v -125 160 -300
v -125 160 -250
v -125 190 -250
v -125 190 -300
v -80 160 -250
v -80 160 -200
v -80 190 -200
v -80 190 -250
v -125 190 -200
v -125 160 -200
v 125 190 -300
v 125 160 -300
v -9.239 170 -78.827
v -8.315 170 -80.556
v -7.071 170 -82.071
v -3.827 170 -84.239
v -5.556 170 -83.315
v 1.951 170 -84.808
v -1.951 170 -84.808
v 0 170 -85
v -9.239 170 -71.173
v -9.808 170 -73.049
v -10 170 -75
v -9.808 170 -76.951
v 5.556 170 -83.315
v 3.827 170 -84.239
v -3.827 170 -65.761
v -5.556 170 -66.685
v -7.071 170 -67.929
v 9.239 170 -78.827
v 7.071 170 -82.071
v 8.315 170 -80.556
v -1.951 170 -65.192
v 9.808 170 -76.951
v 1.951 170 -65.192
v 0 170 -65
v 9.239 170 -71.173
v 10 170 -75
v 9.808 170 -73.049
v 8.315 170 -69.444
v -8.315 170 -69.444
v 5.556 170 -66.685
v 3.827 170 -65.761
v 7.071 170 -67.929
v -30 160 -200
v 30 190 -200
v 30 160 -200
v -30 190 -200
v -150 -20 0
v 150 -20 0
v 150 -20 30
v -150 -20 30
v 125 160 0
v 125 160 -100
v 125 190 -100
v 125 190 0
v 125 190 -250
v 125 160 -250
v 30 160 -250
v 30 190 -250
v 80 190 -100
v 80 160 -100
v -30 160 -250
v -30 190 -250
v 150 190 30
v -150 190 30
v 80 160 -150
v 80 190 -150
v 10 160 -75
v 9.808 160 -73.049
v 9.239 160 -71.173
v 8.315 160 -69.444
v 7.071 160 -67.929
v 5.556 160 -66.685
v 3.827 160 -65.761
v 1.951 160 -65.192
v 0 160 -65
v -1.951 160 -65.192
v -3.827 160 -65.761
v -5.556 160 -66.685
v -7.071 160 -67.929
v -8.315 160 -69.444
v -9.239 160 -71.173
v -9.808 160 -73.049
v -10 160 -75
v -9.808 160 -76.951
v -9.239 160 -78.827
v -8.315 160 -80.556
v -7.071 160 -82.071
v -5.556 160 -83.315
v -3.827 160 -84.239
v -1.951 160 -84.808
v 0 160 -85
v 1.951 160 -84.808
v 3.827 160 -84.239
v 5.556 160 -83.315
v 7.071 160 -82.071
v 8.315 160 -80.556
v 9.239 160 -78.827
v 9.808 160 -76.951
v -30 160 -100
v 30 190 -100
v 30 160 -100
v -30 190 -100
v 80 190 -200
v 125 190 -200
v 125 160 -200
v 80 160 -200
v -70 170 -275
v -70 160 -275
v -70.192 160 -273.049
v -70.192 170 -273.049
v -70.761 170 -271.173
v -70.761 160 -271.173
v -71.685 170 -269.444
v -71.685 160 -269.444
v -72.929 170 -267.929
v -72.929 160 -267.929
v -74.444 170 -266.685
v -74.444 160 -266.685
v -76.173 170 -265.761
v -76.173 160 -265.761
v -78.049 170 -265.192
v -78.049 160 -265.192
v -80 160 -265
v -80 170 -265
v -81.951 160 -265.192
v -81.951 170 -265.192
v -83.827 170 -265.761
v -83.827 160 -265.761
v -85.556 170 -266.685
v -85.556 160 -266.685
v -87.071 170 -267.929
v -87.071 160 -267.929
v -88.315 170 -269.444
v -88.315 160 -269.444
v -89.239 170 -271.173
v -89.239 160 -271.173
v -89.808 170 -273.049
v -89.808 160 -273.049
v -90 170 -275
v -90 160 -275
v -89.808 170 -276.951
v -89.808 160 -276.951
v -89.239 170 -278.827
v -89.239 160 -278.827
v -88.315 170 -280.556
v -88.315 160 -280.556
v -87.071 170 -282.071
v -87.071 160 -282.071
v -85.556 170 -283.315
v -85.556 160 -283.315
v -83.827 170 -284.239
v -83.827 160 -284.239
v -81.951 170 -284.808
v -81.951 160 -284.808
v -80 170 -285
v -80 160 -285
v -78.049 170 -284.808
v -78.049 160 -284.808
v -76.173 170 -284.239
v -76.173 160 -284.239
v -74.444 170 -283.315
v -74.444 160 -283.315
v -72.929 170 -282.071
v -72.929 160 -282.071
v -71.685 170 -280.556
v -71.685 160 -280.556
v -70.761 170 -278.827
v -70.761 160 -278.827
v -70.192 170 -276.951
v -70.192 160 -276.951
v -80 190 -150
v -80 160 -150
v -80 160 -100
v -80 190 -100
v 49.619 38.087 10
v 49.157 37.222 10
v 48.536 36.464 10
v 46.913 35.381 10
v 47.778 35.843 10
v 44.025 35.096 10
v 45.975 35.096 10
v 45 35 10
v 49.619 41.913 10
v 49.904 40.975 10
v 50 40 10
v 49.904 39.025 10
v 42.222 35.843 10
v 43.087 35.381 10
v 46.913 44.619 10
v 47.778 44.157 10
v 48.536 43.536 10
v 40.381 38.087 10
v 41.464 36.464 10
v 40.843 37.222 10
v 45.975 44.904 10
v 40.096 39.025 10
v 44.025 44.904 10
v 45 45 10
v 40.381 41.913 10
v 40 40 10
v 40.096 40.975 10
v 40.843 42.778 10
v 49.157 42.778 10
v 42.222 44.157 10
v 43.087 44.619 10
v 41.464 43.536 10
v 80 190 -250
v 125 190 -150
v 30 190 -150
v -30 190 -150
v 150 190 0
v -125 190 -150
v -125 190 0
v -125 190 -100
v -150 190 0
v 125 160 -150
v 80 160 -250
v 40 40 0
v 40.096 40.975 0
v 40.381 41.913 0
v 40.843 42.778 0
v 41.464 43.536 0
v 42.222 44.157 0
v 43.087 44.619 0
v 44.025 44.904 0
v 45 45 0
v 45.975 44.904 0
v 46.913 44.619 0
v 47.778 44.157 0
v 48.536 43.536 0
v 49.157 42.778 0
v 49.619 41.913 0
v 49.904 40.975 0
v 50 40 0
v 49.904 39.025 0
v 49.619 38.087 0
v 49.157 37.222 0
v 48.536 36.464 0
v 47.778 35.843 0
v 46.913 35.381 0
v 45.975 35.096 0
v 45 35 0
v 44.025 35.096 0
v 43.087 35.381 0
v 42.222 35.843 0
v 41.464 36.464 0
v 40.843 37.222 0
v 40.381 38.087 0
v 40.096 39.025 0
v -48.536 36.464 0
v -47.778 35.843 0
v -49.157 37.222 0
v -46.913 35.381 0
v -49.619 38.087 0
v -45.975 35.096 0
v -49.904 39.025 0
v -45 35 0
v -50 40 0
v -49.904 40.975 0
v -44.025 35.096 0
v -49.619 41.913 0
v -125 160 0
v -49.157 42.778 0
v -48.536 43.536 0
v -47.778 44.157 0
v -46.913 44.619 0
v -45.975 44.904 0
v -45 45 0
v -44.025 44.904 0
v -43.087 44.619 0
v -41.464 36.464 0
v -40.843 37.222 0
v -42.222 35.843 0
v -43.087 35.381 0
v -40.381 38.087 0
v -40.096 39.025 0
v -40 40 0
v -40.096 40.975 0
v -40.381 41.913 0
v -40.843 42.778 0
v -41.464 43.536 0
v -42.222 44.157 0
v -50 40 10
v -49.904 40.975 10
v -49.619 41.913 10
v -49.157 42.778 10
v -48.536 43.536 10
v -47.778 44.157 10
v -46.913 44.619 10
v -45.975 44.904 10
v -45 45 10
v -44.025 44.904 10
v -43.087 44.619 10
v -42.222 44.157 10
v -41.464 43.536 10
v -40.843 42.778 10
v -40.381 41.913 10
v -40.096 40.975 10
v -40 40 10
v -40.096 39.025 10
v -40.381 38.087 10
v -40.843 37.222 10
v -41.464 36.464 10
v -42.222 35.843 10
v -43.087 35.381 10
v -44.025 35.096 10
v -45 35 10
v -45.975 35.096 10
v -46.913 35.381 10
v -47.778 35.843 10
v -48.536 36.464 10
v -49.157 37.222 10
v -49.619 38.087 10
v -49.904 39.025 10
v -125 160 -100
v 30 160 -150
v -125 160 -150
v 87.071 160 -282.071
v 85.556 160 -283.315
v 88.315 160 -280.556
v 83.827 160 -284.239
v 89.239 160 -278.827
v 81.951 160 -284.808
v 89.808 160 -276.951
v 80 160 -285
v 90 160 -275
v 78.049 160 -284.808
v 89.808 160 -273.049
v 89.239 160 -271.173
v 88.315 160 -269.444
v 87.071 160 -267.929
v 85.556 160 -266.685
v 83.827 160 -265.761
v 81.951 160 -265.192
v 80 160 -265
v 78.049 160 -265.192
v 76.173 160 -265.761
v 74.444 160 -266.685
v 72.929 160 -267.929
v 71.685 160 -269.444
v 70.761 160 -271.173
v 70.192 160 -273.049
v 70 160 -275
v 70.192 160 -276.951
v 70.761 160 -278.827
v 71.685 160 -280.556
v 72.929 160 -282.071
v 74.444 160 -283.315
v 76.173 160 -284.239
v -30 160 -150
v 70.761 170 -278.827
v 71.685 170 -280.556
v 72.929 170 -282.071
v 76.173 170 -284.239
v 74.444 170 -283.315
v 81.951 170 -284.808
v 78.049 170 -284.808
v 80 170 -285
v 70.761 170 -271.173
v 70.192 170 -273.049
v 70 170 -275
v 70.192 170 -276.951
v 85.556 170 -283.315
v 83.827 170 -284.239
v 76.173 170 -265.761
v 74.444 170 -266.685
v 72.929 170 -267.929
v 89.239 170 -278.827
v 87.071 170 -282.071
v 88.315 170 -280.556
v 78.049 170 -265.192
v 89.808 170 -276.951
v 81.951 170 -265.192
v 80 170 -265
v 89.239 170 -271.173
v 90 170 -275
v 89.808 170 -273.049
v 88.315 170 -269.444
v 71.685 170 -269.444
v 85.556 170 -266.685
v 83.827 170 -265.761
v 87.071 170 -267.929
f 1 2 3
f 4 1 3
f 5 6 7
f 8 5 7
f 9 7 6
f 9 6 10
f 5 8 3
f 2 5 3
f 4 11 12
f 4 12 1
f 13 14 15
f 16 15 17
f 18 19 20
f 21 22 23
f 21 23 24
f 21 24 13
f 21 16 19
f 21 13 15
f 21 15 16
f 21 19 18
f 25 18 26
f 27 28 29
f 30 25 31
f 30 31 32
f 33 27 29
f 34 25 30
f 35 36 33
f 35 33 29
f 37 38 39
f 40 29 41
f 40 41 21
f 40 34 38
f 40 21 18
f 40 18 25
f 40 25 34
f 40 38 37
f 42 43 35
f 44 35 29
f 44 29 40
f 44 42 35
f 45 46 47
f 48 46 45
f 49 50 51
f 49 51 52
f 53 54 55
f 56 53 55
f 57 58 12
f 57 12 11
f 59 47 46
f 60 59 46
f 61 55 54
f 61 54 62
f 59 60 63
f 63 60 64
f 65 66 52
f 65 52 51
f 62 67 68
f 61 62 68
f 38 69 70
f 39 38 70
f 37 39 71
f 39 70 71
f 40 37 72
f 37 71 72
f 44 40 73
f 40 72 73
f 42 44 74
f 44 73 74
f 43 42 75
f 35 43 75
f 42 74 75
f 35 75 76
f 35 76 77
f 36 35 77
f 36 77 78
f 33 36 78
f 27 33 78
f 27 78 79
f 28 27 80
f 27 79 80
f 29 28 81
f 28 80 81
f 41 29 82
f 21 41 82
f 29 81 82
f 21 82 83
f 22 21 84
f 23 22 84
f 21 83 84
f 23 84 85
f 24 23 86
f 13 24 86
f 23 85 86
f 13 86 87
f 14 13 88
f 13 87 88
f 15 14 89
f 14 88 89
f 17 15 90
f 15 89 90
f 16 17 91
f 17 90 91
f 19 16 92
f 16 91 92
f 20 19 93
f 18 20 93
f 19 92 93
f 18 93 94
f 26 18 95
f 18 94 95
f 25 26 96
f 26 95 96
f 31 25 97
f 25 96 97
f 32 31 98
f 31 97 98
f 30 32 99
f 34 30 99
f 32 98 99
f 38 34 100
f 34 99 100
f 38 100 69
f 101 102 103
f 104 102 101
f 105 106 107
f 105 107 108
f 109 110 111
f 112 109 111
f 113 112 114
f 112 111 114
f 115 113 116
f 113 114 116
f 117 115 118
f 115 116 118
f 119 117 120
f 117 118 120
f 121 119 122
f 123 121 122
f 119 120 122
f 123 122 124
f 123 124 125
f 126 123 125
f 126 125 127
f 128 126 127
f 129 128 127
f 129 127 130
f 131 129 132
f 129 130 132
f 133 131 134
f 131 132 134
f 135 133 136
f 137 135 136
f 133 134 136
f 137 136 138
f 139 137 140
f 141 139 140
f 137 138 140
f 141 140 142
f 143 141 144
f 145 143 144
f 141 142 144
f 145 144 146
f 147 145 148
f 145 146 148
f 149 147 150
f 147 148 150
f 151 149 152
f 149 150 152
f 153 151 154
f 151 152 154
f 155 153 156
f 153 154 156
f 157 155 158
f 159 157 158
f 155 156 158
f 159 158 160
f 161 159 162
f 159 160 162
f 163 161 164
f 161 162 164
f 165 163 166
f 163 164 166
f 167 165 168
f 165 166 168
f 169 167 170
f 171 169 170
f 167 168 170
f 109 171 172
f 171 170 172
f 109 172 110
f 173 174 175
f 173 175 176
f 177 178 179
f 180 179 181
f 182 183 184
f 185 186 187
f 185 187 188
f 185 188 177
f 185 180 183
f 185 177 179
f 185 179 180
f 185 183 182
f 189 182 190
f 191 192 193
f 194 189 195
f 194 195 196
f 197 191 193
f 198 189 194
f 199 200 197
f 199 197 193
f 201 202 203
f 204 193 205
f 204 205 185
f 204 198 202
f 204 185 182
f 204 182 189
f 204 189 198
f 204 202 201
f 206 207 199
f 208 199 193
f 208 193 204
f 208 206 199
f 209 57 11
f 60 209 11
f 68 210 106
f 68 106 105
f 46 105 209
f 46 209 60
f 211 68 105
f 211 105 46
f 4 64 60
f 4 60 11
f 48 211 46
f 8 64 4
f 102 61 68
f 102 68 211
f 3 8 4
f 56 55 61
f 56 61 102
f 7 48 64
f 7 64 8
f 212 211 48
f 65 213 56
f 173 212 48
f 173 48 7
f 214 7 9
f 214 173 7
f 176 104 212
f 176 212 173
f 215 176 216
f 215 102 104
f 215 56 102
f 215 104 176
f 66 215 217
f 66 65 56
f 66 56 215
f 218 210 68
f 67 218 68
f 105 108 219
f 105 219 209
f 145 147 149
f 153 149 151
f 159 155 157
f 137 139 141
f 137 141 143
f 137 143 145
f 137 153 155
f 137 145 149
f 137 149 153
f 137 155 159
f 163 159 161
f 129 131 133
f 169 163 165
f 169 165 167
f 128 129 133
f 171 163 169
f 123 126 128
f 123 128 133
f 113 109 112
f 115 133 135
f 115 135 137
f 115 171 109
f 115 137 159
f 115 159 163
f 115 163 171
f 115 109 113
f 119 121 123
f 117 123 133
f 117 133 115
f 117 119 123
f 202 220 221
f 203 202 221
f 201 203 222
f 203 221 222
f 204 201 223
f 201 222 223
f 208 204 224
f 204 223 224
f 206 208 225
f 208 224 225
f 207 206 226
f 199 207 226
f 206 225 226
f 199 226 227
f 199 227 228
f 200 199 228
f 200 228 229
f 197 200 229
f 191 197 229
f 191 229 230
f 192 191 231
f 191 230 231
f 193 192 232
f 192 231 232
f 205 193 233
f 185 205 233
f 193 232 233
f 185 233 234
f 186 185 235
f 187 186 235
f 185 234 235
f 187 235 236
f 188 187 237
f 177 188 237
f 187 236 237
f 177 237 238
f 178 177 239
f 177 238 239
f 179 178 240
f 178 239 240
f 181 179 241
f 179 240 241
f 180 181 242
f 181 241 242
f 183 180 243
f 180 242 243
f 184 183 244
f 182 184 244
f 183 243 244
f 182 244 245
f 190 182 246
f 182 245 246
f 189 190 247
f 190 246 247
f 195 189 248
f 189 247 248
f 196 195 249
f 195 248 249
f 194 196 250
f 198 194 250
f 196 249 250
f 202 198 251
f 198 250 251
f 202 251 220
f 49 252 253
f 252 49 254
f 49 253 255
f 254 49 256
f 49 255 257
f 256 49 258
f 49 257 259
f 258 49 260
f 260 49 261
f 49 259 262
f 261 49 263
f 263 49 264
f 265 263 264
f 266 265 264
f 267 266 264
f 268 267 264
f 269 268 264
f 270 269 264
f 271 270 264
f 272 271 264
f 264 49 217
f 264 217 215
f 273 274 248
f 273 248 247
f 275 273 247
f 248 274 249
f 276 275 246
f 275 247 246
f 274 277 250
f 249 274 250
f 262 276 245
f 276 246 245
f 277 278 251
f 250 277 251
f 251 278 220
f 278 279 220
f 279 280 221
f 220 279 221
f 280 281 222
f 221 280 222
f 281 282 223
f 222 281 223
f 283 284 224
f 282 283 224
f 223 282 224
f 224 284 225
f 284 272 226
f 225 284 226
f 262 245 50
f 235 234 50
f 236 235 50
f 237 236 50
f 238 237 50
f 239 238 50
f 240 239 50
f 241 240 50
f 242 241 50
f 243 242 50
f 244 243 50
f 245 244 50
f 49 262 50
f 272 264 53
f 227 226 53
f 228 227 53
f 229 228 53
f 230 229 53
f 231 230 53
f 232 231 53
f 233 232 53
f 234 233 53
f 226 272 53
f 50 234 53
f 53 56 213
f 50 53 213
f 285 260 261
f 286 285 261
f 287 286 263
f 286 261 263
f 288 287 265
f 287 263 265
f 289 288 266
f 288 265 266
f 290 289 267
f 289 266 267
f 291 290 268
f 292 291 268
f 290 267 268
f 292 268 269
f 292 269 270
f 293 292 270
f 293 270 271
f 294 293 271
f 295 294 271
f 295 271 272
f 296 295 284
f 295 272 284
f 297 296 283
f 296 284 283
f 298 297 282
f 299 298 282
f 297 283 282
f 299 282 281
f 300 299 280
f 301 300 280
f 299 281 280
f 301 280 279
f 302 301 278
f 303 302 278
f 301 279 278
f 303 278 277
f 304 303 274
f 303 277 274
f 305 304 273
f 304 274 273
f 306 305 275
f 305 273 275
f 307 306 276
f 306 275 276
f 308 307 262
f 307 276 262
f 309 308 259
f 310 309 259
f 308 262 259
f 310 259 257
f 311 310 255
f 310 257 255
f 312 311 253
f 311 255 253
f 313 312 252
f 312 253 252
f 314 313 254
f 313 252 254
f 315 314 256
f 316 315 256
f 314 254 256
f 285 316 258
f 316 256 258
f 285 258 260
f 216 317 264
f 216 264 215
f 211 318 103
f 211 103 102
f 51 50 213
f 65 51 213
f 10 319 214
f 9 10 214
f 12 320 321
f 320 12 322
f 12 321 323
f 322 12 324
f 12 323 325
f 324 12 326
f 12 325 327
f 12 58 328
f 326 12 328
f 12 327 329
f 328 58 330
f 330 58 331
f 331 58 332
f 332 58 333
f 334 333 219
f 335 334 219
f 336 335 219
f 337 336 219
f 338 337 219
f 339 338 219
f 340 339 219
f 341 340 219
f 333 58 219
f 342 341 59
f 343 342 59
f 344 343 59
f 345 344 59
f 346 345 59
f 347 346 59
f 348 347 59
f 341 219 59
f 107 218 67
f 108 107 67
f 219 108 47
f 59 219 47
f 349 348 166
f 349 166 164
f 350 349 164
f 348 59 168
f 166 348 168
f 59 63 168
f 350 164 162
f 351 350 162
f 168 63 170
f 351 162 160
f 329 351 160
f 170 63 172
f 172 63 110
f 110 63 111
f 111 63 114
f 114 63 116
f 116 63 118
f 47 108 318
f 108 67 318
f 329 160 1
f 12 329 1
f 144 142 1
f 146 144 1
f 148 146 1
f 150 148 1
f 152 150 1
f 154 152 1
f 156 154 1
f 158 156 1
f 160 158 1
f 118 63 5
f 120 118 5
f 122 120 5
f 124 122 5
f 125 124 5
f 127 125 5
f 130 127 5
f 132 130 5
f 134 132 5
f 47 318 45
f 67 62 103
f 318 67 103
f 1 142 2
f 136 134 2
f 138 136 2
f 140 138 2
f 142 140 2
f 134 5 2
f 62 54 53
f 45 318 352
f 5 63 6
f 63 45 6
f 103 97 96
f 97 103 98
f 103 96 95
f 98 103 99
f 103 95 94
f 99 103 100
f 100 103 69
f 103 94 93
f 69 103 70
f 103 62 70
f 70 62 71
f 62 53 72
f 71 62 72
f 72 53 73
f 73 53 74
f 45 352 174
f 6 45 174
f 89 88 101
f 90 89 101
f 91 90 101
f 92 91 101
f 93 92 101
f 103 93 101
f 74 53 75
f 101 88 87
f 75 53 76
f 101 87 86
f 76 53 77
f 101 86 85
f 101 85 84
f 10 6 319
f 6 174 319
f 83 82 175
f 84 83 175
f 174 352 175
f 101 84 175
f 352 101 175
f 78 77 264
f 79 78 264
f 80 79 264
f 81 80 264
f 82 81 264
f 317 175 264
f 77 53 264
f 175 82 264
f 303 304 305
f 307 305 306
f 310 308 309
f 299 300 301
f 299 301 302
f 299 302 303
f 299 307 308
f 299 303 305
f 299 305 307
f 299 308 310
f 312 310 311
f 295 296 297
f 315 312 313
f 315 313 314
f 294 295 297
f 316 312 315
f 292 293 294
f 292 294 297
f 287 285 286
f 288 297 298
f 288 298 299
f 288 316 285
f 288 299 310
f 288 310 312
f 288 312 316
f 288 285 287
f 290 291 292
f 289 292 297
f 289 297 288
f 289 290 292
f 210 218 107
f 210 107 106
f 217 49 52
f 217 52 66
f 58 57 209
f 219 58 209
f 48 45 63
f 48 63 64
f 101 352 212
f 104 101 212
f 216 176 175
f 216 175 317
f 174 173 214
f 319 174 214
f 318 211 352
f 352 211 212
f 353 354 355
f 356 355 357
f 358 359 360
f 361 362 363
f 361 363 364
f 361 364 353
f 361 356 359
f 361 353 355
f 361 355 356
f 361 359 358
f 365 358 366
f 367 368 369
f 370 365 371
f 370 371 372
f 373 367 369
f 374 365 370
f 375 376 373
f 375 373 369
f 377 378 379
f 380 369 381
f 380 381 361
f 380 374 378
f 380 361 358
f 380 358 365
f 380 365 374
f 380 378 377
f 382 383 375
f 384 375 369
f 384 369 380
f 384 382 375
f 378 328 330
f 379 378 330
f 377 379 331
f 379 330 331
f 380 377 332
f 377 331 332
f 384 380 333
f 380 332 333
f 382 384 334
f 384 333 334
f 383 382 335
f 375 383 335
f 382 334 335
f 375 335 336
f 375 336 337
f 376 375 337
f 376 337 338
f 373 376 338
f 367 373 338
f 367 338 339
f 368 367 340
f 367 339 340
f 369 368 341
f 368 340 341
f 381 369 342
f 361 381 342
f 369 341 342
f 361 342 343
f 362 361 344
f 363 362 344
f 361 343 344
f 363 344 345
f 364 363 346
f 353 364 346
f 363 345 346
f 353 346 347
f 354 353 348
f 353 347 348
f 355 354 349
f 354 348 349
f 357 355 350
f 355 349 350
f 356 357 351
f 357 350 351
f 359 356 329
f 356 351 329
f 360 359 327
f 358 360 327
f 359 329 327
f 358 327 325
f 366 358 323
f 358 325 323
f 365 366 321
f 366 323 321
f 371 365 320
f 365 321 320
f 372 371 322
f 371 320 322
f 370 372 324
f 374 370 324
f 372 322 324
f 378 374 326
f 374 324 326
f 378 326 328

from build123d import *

# Parameters (mm, degrees)
SKETCH1_W           = 300
SKETCH1_H           = 380
BOSS_EXTRUDE1_DEPTH = 30
SKETCH3_W           = 250
SKETCH3_H           = 30
BOSS_EXTRUDE2_DEPTH = 100
BOSS_EXTRUDE3_START = 150
SKETCH3_2_W         = 250
SKETCH3_2_H         = 30
BOSS_EXTRUDE3_DEPTH = 50
BOSS_EXTRUDE4_START = 250
SKETCH3_3_W         = 250
SKETCH3_3_H         = 30
BOSS_EXTRUDE4_DEPTH = 50
BOSS_EXTRUDE5_REACH = 303.662
SKETCH4_W           = 50
SKETCH4_H           = 30
BOSS_EXTRUDE6_START = -50
SKETCH4_2_W         = 50
SKETCH4_2_H         = 30
BOSS_EXTRUDE6_DEPTH = 50
SKETCH5_R           = 10
CUT_EXTRUDE1_DEPTH  = 10
SKETCH6_R           = 5
CUT_EXTRUDE2_DEPTH  = 10
SKETCH7_W           = 300
SKETCH7_H           = 170
CUT_EXTRUDE3_DEPTH  = 30


with BuildPart() as part:
    # Sketch1 → Boss-Extrude1 (new body)
    with BuildSketch(Plane.XY):
        Rectangle(SKETCH1_W, SKETCH1_H)
    extrude(amount=BOSS_EXTRUDE1_DEPTH)

    # Sketch3 → Boss-Extrude2 (add)
    with BuildSketch(Plane(origin=(0, 0, 0), x_dir=(-1, 0, 0), z_dir=(0, 0, -1))):
        with Locations((0, 175)):
            Rectangle(SKETCH3_W, SKETCH3_H)
    extrude(amount=BOSS_EXTRUDE2_DEPTH)

    # Sketch4 → Boss-Extrude5 (add, up to next)
    with BuildSketch(Plane.XY.offset(-150), mode=Mode.PRIVATE) as boss_extrude5_sk1:
        with Locations((-55, 175)):
            Rectangle(SKETCH4_W, SKETCH4_H)
    boss_extrude5_tool1 = extrude(boss_extrude5_sk1.sketch, amount=BOSS_EXTRUDE5_REACH, mode=Mode.PRIVATE) - part.part
    # Sketch4 → Boss-Extrude5 (add, up to next)
    with BuildSketch(Plane.XY.offset(-150), mode=Mode.PRIVATE) as boss_extrude5_sk2:
        with Locations((55, 175)):
            Rectangle(SKETCH4_W, SKETCH4_H)
    boss_extrude5_tool2 = extrude(boss_extrude5_sk2.sketch, amount=BOSS_EXTRUDE5_REACH, mode=Mode.PRIVATE) - part.part


with BuildPart() as body_2:
    # Sketch3<2> → Boss-Extrude3 (new body)
    with BuildSketch(Plane(origin=(0, 0, 0), x_dir=(-1, 0, 0), z_dir=(0, 0, -1)).offset(BOSS_EXTRUDE3_START)):
        with Locations((0, 175)):
            Rectangle(SKETCH3_2_W, SKETCH3_2_H)
    extrude(amount=BOSS_EXTRUDE3_DEPTH)


with BuildPart() as body_3:
    # Sketch3<3> → Boss-Extrude4 (new body)
    with BuildSketch(Plane(origin=(0, 0, 0), x_dir=(-1, 0, 0), z_dir=(0, 0, -1)).offset(BOSS_EXTRUDE4_START)):
        with Locations((0, 175)):
            Rectangle(SKETCH3_3_W, SKETCH3_3_H)
    extrude(amount=BOSS_EXTRUDE4_DEPTH)


with BuildPart() as part_1:
    add(part.part)

    add(body_2.part)  # Boss-Extrude5 merges body 2
    add(boss_extrude5_tool1.solids().sort_by_distance((-55, 175, -150))[0])
    add(boss_extrude5_tool2.solids().sort_by_distance((55, 175, -150))[0])


    add(body_3.part)  # Boss-Extrude6 merges body 3
    # Sketch4<2> → Boss-Extrude6 (add)
    with BuildSketch(Plane.XY.offset(-150).offset(BOSS_EXTRUDE6_START)):
        with Locations((-55, 175)):
            Rectangle(SKETCH4_2_W, SKETCH4_2_H)
        with Locations((55, 175)):
            Rectangle(SKETCH4_2_W, SKETCH4_2_H)
    extrude(amount=-BOSS_EXTRUDE6_DEPTH)

    # Sketch5 → Cut-Extrude1 (cut)
    with BuildSketch(Plane.XZ.offset(-160)):
        with Locations((-80, -275)):
            Circle(SKETCH5_R)
        with Locations((80, -275)):
            Circle(SKETCH5_R)
        with Locations((0, -75)):
            Circle(SKETCH5_R)
    extrude(amount=-CUT_EXTRUDE1_DEPTH, mode=Mode.SUBTRACT)

    # Sketch6 → Cut-Extrude2 (cut)
    with BuildSketch(Plane(origin=(0, 0, 0), x_dir=(-1, 0, 0), z_dir=(0, 0, -1))):
        with Locations((-45, 40)):
            Circle(SKETCH6_R)
        with Locations((45, 40)):
            Circle(SKETCH6_R)
    extrude(amount=-CUT_EXTRUDE2_DEPTH, mode=Mode.SUBTRACT)

    # Sketch7 → Cut-Extrude3 (cut)
    with BuildSketch(Plane(origin=(0, 0, 0), x_dir=(-1, 0, 0), z_dir=(0, 0, -1))):
        with Locations((0, -105)):
            Rectangle(SKETCH7_W, SKETCH7_H)
    extrude(amount=-CUT_EXTRUDE3_DEPTH, mode=Mode.SUBTRACT)


solid = part_1.part
